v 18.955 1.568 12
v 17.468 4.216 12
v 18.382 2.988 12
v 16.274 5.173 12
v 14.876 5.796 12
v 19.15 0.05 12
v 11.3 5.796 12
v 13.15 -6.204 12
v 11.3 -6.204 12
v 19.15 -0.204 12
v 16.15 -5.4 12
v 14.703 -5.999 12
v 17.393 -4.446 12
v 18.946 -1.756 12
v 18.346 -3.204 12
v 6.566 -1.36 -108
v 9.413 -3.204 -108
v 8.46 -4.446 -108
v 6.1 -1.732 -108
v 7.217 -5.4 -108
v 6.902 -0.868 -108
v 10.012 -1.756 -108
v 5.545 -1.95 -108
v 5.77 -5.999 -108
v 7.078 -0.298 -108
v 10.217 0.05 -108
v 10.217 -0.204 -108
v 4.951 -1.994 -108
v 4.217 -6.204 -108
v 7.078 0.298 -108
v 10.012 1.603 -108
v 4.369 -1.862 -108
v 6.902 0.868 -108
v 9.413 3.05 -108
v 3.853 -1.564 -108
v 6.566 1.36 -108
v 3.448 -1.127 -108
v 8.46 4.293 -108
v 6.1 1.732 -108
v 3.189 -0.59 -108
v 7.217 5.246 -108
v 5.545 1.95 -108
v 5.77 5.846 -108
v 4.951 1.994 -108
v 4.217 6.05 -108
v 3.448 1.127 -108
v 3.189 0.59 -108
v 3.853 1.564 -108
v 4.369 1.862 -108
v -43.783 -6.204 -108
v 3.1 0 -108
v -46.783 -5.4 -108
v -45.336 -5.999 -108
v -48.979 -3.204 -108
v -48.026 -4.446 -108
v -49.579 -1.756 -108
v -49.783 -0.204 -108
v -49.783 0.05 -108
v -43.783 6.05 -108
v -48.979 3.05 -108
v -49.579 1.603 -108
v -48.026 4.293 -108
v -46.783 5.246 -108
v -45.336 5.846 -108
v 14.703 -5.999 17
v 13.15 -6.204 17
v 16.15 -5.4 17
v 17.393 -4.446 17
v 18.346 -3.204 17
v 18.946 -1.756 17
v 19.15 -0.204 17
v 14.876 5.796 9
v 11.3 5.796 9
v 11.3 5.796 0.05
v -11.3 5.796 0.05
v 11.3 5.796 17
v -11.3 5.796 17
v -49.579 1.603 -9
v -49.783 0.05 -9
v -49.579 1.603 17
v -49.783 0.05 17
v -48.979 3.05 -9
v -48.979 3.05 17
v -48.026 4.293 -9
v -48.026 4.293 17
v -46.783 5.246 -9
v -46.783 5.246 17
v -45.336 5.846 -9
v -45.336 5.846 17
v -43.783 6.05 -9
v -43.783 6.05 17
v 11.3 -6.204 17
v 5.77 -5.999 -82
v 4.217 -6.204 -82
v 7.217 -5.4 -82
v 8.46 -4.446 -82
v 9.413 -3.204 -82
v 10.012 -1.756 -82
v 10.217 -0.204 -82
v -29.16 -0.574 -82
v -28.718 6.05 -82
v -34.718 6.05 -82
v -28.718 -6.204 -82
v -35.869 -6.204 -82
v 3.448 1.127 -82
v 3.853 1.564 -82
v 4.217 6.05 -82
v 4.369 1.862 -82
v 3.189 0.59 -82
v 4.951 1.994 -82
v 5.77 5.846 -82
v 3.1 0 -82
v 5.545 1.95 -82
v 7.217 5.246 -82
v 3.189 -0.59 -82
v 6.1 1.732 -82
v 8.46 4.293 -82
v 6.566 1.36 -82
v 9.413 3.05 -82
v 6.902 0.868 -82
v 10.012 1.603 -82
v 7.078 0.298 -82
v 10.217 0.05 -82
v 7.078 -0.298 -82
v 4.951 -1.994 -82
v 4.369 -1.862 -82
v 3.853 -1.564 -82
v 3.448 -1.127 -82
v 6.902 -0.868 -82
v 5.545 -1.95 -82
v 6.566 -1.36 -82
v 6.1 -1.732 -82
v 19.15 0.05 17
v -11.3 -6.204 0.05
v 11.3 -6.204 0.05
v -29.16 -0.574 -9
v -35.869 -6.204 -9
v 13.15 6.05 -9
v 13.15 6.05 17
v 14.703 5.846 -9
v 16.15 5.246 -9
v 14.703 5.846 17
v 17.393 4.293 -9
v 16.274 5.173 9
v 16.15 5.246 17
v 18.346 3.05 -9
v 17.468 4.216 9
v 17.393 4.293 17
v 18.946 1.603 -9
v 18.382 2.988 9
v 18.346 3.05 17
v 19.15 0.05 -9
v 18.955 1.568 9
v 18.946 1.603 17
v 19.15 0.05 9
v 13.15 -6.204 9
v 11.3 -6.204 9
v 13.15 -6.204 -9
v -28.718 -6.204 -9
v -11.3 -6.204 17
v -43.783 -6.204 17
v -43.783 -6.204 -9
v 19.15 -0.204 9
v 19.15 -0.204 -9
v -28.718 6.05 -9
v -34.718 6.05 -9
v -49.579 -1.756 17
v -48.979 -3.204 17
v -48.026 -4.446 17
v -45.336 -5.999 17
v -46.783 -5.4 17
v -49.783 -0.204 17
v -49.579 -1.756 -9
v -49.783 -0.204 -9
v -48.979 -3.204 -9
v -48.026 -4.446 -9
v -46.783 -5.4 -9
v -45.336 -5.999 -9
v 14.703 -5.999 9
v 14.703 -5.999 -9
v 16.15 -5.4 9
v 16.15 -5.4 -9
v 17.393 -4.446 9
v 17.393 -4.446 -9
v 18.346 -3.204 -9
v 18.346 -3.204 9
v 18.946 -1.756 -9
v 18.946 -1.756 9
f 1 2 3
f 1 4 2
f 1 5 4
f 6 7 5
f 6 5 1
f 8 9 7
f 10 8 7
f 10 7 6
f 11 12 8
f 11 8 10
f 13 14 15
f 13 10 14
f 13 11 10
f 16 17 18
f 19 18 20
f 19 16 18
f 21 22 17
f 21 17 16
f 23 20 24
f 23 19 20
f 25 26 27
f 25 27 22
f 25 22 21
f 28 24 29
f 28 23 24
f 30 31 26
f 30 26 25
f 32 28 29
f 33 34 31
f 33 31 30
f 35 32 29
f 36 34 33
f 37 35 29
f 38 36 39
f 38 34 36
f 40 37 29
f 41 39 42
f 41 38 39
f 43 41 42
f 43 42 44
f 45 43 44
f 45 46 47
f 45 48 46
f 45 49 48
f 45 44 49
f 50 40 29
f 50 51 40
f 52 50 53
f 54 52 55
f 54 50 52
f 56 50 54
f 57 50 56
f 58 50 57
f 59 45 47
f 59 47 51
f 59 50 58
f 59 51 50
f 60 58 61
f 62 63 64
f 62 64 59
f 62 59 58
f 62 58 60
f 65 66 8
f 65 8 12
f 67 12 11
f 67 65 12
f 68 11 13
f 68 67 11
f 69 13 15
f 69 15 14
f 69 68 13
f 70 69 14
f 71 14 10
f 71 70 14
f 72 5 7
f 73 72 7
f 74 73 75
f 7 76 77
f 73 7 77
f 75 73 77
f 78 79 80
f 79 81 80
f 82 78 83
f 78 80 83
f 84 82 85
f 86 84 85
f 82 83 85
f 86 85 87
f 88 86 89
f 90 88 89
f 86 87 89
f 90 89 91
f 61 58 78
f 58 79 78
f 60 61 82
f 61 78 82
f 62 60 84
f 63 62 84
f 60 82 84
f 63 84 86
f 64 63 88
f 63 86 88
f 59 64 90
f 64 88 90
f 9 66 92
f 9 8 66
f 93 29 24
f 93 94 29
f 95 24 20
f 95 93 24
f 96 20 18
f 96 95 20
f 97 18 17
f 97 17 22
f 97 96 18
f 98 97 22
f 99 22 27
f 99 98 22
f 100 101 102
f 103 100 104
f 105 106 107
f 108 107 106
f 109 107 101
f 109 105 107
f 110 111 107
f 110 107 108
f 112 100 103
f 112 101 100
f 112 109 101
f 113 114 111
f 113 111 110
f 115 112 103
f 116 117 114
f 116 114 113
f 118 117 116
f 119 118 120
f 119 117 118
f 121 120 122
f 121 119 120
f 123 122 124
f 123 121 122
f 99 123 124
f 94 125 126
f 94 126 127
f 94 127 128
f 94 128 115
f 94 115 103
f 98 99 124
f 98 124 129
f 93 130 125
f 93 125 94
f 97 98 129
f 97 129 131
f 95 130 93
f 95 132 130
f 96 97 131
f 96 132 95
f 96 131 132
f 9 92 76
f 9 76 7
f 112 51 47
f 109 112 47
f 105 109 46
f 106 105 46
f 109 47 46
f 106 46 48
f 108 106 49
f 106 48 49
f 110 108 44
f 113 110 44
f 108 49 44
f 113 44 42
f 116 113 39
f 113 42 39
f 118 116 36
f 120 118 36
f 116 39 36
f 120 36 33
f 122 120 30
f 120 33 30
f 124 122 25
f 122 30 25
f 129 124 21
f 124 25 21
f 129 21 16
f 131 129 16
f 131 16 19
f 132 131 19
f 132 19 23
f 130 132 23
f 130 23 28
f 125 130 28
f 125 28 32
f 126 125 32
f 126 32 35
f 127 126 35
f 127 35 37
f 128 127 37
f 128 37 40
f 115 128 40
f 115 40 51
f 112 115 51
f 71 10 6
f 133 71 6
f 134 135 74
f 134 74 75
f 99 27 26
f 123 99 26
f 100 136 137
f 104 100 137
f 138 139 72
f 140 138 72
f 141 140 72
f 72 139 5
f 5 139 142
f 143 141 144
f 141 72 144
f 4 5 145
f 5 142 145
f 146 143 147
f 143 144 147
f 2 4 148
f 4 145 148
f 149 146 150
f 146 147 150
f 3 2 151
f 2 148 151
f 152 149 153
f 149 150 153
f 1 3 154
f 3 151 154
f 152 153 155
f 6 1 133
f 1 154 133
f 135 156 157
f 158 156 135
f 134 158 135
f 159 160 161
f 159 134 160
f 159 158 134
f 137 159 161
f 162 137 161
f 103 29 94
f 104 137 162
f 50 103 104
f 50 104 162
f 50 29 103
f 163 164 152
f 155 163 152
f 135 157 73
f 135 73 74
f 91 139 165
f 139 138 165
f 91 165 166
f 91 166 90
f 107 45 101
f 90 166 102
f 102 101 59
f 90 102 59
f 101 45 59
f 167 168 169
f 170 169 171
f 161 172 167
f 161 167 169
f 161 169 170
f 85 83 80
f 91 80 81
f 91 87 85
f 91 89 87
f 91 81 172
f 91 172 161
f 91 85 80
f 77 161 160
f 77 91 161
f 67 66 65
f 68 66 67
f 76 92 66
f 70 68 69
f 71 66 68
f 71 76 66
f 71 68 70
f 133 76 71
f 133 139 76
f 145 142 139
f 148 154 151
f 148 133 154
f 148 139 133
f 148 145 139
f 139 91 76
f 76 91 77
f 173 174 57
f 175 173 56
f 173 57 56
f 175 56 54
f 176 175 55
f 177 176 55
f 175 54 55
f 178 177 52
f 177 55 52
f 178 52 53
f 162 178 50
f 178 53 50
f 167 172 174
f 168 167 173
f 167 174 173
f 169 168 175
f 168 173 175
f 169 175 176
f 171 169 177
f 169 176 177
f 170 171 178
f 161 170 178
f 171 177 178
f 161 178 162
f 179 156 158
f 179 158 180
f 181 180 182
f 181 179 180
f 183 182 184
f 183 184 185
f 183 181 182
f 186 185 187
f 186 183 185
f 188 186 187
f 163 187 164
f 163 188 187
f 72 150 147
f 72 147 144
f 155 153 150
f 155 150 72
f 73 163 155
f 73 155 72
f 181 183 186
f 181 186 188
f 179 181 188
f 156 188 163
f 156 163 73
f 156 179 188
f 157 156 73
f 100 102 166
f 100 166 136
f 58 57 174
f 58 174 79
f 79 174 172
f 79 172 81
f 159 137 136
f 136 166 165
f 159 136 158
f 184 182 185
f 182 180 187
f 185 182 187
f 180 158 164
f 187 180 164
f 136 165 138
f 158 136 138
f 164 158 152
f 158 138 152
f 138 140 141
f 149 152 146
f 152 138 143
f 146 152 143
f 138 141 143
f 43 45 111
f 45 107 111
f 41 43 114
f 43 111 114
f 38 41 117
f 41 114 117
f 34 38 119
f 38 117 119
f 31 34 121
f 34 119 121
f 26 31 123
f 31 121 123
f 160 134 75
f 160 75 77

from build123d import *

# Parameters (mm, degrees)
SALIENTE_EXTRUIR1_DEPTH      = 17
SALIENTE_EXTRUIR1_DEPTH_BACK = 9
CROQUIS1_W                   = 68.933075381
CROQUIS1_H                   = 12.253553391
CROQUIS2_W                   = 21.064851014
CROQUIS2_H                   = 12.253553391
SALIENTE_EXTRUIR2_DEPTH      = 99
CROQUIS3_W                   = 60
CROQUIS3_H                   = 12.253553391
SALIENTE_EXTRUIR3_DEPTH      = 26
REDONDEO1_R                  = 6
CHAFL_N1_SIZE                = 6
CHAFL_N1_SIZE_2              = 7.150521556
CORTAR_EXTRUIR1_REACH        = 136.692
CROQUIS5_R                   = 2
REDONDEO2_R                  = 6
CORTAR_EXTRUIR2_DEPTH        = 12


with BuildPart() as part:
    # Croquis1 → Saliente-Extruir1 (new, two sides: drawn at the far end of the back side and taken through both)
    with BuildSketch(Plane.XY.offset(-SALIENTE_EXTRUIR1_DEPTH_BACK)):
        with Locations((-15.316537691, -0.076776695)):
            Rectangle(CROQUIS1_W, CROQUIS1_H)
    extrude(amount=SALIENTE_EXTRUIR1_DEPTH + SALIENTE_EXTRUIR1_DEPTH_BACK)

    # Croquis2 → Saliente-Extruir2 (add)
    with BuildSketch(Plane(origin=(0, 0, -9), x_dir=(-1, 0, 0), z_dir=(0, 0, -1))):
        with Locations((39.250649874, -0.076776695)):
            Rectangle(CROQUIS2_W, CROQUIS2_H)
    extrude(amount=SALIENTE_EXTRUIR2_DEPTH)

    # Croquis3 → Saliente-Extruir3 (add)
    with BuildSketch(Plane(origin=(0, 0, -108), x_dir=(-1, 0, 0), z_dir=(0, 0, -1))):
        with Locations((19.783075381, -0.076776695)):
            Rectangle(CROQUIS3_W, CROQUIS3_H)
    extrude(amount=-SALIENTE_EXTRUIR3_DEPTH)

    # Redondeo1
    redondeo1_edges = [part.edges().sort_by_distance(p)[0] for p in [
        (-49.783075381, 6.05, -45.5),
        (-49.783075381, -6.203553391, -45.5),
    ]]
    fillet(redondeo1_edges, radius=REDONDEO1_R)

    # Chaflán1
    # the kernel refuses this chamfer: 7.150521556, 6 mm, written as the material it takes off along each edge
    with BuildSketch(Plane(origin=(-28.718224367, -6.203553391, -9), x_dir=(0.03540953691366326, 0.9993728857116146, 0), z_dir=(0, 0, -1)), Plane(origin=(-28.718224367, 6.05, -9), x_dir=(-0.9993728857116146, 0.03540953691366412, 0), z_dir=(0, 0, -1))) as chafl_n1_piece_1:
        Polygon((CHAFL_N1_SIZE * 0.999372885712, -CHAFL_N1_SIZE * 0.0354095369137), (-CHAFL_N1_SIZE_2 * 0.0354095369115, -CHAFL_N1_SIZE_2 * 0.999372885651), (0, 0), align=None)
    extrude(amount=73, mode=Mode.SUBTRACT)

    # Croquis5 → Cortar-Extruir1 (cut, up to next)
    with BuildSketch(Plane(origin=(0, 0, -108), x_dir=(-1, 0, 0), z_dir=(0, 0, -1)), mode=Mode.PRIVATE) as cortar_extruir1_sk1:
        with Locations((-5.1, 0)):
            Circle(CROQUIS5_R)
    cortar_extruir1_tool1 = extrude(cortar_extruir1_sk1.sketch, amount=-CORTAR_EXTRUIR1_REACH, mode=Mode.PRIVATE) & part.part
    add(cortar_extruir1_tool1.solids().sort_by_distance((5.1, 0, -108))[0], mode=Mode.SUBTRACT)

    # Redondeo2
    redondeo2_edges = [part.edges().sort_by_distance(p)[0] for p in [
        (10.216924619, 6.05, -95),
        (10.216924619, -6.203553391, -95),
        (19.15, 6.05, 4),
        (19.15, -6.203553391, 4),
    ]]
    fillet(redondeo2_edges, radius=REDONDEO2_R)

    # Croquis6 → Cortar-Extruir2 (cut)
    with BuildSketch(Plane.XZ.offset(6.203553391)):
        Polygon((-11.3, 0.05), (-11.3, 17), (11.3, 17), (11.3, 12), (19.15, 12), (19.15, 9), (11.3, 9), (11.3, 0.05), align=None)
    extrude(amount=-CORTAR_EXTRUIR2_DEPTH, mode=Mode.SUBTRACT)


solid = part.part
